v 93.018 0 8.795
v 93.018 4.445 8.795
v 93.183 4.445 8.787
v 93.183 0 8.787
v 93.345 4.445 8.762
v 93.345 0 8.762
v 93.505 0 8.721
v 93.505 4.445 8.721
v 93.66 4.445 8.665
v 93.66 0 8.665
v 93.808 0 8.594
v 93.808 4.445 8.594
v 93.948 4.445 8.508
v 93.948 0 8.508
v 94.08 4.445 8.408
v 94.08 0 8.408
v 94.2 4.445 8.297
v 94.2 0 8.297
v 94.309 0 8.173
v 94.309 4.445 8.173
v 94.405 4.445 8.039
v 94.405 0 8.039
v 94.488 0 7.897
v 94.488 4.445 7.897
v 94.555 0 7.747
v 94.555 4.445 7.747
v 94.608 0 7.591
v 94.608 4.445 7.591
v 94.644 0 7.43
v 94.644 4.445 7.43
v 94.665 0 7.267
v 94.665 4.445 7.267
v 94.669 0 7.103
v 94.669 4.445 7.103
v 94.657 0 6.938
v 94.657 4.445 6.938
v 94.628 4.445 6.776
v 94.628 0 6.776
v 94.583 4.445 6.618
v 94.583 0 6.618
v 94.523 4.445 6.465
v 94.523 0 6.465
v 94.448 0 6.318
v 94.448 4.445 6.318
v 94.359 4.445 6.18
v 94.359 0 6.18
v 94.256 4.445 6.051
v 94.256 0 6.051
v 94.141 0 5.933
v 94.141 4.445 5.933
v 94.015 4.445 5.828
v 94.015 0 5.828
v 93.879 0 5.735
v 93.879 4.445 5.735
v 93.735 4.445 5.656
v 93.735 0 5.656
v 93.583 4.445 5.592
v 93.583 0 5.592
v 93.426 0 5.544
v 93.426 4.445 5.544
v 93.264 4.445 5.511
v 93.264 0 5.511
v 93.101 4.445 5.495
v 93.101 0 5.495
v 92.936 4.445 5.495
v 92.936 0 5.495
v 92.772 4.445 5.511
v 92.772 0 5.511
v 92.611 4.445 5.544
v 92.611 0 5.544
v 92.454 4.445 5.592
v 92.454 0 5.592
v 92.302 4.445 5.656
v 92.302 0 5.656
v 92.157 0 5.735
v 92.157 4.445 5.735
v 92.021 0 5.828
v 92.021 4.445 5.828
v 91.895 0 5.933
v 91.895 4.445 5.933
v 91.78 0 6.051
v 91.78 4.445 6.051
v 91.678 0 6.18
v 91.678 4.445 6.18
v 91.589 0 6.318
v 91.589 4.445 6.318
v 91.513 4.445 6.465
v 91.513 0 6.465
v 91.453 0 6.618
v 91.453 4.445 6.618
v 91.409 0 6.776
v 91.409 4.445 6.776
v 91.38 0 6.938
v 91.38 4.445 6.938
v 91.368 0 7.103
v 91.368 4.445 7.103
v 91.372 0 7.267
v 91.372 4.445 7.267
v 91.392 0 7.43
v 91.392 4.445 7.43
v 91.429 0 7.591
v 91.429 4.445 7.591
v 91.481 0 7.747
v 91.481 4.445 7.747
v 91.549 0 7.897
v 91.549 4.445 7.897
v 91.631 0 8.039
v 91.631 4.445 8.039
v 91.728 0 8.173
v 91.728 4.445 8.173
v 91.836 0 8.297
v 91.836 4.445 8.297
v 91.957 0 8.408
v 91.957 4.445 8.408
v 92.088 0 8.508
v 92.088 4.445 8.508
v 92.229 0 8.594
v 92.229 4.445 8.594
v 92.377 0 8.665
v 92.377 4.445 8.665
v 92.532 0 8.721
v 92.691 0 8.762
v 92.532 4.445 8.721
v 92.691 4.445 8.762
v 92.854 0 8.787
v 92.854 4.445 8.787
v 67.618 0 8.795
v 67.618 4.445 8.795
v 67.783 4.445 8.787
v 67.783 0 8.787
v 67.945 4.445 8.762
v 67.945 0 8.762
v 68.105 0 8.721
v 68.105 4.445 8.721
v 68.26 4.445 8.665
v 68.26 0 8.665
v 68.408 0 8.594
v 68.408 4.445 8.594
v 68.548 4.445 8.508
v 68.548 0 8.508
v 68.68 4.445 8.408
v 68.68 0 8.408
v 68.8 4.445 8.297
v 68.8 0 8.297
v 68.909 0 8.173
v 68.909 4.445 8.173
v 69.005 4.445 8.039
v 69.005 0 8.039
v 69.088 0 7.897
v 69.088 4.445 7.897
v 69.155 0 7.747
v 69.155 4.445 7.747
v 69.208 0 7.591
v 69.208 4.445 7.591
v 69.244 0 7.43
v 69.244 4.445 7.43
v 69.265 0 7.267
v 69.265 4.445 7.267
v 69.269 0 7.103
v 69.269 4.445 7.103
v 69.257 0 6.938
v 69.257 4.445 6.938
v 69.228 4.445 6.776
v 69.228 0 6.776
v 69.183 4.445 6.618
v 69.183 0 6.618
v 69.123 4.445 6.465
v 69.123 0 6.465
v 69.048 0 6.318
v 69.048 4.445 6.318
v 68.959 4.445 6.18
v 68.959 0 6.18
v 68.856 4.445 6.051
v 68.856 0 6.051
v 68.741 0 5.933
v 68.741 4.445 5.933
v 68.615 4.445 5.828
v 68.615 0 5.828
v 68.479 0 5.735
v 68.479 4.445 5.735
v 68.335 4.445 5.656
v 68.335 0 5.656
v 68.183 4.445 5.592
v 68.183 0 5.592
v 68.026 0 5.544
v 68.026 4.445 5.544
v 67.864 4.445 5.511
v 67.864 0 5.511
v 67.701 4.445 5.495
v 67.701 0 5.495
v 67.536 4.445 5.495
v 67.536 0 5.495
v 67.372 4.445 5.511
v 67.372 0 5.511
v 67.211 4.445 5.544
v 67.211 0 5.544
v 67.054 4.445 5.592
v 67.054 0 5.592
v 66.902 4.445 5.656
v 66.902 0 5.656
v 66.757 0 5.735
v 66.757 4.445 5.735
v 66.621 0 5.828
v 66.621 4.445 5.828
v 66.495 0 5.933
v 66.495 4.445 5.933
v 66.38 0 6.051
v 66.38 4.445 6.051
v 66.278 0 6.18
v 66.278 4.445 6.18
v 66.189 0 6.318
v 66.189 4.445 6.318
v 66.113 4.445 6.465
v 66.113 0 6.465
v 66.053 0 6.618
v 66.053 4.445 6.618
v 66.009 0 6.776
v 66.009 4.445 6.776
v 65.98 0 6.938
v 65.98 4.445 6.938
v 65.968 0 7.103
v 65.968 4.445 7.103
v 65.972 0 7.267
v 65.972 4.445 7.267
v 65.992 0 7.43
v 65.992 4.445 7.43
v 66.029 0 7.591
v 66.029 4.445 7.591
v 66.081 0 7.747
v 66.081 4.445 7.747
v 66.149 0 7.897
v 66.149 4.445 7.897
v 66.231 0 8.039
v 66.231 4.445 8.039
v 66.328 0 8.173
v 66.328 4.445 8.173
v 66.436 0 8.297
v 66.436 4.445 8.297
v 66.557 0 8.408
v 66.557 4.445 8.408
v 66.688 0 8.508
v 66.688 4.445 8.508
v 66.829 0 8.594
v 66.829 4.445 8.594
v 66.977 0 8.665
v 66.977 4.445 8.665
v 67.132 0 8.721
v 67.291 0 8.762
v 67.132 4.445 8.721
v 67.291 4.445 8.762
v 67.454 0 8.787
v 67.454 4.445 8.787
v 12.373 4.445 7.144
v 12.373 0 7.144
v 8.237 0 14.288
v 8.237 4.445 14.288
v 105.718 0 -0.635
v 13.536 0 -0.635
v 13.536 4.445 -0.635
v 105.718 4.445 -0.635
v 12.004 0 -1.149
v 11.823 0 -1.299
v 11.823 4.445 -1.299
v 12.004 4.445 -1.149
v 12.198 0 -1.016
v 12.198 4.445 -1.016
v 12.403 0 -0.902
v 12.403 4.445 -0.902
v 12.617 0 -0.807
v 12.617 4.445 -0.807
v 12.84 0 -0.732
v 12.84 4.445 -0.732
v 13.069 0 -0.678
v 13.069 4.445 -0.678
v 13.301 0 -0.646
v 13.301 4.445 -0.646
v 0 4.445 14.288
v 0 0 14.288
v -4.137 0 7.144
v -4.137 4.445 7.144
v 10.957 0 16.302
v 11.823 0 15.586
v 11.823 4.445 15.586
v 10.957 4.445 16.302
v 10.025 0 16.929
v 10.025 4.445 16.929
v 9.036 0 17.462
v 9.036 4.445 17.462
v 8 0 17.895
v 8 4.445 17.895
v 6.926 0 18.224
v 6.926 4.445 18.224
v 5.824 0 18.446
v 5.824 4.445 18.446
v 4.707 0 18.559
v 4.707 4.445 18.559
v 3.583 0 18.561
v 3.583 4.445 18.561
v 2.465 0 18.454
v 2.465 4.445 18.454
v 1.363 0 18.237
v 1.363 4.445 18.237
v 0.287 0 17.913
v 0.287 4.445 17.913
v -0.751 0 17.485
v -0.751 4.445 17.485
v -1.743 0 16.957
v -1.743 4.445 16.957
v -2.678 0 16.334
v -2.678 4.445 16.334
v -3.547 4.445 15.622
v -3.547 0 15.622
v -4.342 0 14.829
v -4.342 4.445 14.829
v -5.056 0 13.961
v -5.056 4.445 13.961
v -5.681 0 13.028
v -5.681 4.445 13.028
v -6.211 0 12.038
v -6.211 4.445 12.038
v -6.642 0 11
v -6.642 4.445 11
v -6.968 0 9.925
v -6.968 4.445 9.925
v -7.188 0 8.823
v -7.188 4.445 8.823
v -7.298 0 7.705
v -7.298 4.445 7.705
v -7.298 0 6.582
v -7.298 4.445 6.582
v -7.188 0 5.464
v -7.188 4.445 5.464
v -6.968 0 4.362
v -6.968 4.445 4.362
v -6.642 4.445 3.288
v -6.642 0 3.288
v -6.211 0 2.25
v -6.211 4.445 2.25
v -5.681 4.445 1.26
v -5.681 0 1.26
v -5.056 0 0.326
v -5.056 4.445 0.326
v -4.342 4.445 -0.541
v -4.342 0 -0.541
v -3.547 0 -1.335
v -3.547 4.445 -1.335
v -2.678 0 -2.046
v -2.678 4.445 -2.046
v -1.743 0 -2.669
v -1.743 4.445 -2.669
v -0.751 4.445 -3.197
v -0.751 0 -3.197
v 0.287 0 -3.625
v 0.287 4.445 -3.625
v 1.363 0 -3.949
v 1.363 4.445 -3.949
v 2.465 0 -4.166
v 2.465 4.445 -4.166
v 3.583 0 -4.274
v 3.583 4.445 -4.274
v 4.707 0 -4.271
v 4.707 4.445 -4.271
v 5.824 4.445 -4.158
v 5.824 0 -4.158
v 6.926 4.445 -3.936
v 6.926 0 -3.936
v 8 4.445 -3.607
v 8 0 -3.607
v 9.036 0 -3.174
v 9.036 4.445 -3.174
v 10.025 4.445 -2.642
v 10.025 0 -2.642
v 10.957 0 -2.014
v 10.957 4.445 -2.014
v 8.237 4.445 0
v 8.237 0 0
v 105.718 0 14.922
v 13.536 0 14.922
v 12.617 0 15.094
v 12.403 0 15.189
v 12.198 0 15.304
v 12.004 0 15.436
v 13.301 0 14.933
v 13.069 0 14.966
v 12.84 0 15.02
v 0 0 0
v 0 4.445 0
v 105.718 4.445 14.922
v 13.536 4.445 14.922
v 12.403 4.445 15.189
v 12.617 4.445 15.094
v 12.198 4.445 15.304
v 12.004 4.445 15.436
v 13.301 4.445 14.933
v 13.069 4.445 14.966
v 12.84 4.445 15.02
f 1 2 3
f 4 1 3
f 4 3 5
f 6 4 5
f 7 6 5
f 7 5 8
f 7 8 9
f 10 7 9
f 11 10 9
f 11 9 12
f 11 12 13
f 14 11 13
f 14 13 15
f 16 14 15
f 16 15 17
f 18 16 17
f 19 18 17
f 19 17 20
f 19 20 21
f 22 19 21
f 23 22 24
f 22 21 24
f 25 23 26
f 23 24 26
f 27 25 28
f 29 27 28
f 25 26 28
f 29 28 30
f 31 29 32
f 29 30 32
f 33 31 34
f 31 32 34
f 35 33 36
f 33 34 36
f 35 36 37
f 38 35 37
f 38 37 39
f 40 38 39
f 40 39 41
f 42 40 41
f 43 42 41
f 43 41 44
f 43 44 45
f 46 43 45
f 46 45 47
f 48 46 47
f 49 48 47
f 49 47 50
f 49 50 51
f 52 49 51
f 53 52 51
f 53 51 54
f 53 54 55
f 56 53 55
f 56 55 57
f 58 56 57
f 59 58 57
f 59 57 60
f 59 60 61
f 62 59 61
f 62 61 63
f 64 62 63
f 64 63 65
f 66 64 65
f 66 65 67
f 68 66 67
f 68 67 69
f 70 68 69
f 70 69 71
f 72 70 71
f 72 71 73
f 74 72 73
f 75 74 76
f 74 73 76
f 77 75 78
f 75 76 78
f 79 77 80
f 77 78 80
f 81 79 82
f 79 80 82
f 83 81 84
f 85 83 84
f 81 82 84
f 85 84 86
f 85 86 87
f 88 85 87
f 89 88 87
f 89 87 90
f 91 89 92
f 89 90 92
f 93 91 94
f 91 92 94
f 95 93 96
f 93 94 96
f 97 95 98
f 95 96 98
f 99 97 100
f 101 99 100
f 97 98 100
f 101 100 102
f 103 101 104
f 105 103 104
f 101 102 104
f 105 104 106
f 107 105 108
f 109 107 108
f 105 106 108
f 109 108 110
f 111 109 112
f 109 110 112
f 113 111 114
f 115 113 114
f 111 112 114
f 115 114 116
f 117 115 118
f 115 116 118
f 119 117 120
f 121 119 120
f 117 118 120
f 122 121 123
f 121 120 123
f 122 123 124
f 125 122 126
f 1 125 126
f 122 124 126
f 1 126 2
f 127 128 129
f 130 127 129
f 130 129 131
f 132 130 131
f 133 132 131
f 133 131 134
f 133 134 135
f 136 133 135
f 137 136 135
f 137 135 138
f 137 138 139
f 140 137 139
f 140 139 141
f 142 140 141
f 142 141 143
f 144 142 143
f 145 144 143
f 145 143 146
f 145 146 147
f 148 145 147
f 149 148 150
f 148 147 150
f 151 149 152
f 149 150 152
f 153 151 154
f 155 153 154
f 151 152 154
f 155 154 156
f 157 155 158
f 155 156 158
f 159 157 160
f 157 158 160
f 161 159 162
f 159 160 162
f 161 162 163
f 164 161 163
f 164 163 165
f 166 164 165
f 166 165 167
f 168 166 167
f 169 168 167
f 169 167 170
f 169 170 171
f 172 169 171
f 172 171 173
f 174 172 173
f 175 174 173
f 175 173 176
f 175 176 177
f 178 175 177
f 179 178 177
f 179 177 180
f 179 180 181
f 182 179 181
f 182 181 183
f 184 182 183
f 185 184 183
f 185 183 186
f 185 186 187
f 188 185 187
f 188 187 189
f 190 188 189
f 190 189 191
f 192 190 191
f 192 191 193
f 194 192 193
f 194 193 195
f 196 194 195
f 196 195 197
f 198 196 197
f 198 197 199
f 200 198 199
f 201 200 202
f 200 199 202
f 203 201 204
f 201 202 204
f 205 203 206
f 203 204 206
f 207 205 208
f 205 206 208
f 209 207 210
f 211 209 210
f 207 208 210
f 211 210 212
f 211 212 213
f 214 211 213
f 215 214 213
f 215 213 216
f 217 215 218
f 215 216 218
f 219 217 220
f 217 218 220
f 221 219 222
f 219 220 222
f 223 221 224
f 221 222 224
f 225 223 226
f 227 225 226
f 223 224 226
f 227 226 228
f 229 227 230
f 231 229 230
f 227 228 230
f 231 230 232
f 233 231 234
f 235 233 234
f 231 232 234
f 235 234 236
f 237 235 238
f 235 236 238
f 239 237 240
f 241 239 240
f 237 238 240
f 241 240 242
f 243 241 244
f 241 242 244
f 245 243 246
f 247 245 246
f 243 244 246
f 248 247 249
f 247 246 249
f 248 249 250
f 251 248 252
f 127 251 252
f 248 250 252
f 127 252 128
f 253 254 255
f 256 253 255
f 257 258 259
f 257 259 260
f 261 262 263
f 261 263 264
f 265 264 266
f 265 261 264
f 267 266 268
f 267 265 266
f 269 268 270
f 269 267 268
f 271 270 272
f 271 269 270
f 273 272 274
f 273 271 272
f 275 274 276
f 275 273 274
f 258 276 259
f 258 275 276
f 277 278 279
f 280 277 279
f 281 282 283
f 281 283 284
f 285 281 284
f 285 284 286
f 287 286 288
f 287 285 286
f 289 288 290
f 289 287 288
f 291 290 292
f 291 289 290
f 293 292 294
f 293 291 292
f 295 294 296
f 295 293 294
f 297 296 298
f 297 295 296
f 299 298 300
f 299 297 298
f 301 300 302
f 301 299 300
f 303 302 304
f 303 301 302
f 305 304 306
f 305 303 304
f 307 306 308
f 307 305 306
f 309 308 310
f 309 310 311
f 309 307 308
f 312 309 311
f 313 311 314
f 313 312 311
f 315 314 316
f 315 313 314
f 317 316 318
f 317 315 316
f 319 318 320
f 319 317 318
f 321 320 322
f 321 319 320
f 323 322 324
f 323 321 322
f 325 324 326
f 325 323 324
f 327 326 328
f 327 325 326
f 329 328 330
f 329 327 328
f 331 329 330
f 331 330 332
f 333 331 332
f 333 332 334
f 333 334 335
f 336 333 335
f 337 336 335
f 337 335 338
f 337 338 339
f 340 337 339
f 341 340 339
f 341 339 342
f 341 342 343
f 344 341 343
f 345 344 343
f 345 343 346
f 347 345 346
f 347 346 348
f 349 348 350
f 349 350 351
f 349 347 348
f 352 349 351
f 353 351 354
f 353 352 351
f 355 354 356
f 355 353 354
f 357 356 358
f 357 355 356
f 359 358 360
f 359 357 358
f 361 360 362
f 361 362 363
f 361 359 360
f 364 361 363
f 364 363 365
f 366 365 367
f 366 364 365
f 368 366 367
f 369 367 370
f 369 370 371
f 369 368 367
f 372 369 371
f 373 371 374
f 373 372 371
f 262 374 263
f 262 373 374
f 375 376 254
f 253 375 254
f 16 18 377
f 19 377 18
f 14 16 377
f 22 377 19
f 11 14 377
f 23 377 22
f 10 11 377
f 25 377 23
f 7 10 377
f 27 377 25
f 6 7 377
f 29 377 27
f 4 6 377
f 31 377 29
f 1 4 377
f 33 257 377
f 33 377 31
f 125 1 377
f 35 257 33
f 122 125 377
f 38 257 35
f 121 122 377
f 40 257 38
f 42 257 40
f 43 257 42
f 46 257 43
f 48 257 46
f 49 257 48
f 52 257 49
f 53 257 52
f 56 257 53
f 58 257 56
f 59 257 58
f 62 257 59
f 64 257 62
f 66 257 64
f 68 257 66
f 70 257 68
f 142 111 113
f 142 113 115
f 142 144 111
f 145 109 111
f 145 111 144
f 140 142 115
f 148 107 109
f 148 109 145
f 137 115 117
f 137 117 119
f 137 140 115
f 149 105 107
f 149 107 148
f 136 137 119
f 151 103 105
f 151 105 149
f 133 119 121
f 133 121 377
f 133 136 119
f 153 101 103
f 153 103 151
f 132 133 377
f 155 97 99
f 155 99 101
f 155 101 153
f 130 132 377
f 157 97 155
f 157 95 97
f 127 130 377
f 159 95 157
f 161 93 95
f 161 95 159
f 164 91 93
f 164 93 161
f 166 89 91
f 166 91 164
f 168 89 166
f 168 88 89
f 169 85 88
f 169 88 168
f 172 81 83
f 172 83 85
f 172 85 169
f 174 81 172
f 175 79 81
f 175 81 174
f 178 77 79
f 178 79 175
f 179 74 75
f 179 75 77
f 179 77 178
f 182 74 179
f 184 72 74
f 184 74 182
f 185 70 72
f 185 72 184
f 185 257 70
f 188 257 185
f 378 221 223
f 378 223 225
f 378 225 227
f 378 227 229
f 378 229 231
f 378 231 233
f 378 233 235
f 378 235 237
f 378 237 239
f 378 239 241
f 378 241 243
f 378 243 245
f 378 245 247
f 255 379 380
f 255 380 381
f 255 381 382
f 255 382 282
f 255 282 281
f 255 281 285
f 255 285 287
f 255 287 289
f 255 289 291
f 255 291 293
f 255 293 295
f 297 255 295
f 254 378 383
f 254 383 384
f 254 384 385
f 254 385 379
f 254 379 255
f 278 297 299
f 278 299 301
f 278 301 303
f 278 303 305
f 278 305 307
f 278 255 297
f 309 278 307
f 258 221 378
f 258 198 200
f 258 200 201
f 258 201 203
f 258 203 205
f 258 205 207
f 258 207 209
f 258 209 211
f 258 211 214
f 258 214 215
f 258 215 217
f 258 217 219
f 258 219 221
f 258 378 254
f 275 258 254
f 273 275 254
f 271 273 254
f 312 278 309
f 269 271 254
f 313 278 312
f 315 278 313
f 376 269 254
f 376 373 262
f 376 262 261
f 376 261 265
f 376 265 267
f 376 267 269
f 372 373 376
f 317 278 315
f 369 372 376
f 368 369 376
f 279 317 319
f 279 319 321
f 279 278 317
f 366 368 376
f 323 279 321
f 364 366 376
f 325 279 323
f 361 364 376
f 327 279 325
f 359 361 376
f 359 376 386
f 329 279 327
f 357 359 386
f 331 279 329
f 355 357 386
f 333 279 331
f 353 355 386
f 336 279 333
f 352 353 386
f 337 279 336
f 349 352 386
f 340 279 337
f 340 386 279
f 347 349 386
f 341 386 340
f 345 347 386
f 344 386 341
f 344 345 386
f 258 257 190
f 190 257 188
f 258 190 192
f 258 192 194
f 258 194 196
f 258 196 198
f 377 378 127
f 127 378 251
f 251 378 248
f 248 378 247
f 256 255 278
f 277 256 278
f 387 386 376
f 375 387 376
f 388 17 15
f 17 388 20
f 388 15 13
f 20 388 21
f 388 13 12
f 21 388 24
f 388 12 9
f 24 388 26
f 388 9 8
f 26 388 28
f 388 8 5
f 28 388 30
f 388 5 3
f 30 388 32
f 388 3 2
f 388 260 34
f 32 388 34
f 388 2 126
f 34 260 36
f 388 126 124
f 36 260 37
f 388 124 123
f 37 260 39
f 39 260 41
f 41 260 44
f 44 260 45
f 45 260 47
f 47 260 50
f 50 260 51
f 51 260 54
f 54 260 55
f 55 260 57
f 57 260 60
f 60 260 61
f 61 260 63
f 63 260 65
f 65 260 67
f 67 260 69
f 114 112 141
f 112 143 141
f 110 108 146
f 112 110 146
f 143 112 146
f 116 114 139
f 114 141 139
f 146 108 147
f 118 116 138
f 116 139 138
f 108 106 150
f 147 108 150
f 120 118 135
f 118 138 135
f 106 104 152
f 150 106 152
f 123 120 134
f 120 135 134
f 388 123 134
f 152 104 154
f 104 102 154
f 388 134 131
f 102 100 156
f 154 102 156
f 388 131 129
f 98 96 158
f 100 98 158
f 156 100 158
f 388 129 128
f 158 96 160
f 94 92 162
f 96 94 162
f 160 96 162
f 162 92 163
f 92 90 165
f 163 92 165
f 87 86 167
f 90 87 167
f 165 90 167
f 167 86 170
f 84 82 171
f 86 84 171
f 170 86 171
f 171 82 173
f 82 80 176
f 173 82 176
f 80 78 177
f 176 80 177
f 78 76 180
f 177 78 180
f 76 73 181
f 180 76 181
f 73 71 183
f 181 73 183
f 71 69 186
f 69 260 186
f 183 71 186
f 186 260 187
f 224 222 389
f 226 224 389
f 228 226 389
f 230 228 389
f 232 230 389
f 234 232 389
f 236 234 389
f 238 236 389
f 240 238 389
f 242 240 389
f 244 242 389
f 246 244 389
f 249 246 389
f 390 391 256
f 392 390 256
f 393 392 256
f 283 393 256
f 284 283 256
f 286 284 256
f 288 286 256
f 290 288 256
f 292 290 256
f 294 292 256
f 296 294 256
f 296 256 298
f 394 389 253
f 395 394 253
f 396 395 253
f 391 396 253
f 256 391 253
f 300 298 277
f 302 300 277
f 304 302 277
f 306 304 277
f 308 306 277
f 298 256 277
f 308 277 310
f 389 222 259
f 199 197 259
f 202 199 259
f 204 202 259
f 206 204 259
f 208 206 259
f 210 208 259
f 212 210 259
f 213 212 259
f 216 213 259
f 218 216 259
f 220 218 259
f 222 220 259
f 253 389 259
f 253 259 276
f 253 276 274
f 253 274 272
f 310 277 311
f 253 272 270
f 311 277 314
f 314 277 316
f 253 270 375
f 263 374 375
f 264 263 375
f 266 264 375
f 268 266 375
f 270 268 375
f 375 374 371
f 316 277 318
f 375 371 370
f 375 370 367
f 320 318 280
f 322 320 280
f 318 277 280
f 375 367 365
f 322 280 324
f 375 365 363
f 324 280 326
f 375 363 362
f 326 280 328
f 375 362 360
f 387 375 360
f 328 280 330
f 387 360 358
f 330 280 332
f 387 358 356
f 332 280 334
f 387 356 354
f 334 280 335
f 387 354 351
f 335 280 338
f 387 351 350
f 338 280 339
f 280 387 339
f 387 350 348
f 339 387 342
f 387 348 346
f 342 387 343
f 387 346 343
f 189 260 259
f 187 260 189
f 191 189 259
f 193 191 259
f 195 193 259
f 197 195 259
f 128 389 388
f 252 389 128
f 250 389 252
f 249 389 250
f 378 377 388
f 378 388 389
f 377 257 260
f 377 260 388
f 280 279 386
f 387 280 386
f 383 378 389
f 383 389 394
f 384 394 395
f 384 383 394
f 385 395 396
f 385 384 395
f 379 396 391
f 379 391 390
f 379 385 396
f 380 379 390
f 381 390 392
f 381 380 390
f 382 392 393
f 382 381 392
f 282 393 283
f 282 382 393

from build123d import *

# Parameters (mm, degrees)
BOSS_EXTRUDE1_DEPTH = 4.445
SKETCH2_R           = 1.651
CUT_EXTRUDE1_DEPTH  = 108.429567879


with BuildPart() as part:
    # Sketch1 → Boss-Extrude1 (new body)
    with BuildSketch(Plane(origin=(0, 0, 0), x_dir=(1, 0, 0), z_dir=(0, 1, 0))):
        with BuildLine():
            Line((13.535585603, 0.635), (105.718351485, 0.635))
            Line((105.718351485, 0.635), (105.718351485, -14.9225))
            Line((105.718351485, -14.9225), (13.535585603, -14.9225))
            ThreePointArc((13.535585603, -14.9225), (12.61737712, -15.094274254), (11.823361218, -15.586363636))
            ThreePointArc((11.823361218, -15.586363636), (-7.311648515, -7.14375), (11.823361218, 1.298863636))
            ThreePointArc((11.823361218, 1.298863636), (12.61737712, 0.806774254), (13.535585603, 0.635))
        make_face()
        Polygon((0, 0), (8.23670297, 0), (12.373351485, -7.14375), (8.23670297, -14.2875), (0, -14.2875), (-4.136648515, -7.14375), align=None, mode=Mode.SUBTRACT)
    extrude(amount=BOSS_EXTRUDE1_DEPTH)

    # Sketch2 → Cut-Extrude1 (cut, through all)
    with BuildSketch(Plane(origin=(0, 4.445, 0), x_dir=(1, 0, 0), z_dir=(0, 1, 0))):
        with Locations(Location((93.018351485, -7.14375, 0), (0, 0, 270))):
            Circle(SKETCH2_R)
        with Locations(Location((67.618351485, -7.14375, 0), (0, 0, 270))):
            Circle(SKETCH2_R)
    extrude(amount=-CUT_EXTRUDE1_DEPTH, mode=Mode.SUBTRACT)


solid = part.part
